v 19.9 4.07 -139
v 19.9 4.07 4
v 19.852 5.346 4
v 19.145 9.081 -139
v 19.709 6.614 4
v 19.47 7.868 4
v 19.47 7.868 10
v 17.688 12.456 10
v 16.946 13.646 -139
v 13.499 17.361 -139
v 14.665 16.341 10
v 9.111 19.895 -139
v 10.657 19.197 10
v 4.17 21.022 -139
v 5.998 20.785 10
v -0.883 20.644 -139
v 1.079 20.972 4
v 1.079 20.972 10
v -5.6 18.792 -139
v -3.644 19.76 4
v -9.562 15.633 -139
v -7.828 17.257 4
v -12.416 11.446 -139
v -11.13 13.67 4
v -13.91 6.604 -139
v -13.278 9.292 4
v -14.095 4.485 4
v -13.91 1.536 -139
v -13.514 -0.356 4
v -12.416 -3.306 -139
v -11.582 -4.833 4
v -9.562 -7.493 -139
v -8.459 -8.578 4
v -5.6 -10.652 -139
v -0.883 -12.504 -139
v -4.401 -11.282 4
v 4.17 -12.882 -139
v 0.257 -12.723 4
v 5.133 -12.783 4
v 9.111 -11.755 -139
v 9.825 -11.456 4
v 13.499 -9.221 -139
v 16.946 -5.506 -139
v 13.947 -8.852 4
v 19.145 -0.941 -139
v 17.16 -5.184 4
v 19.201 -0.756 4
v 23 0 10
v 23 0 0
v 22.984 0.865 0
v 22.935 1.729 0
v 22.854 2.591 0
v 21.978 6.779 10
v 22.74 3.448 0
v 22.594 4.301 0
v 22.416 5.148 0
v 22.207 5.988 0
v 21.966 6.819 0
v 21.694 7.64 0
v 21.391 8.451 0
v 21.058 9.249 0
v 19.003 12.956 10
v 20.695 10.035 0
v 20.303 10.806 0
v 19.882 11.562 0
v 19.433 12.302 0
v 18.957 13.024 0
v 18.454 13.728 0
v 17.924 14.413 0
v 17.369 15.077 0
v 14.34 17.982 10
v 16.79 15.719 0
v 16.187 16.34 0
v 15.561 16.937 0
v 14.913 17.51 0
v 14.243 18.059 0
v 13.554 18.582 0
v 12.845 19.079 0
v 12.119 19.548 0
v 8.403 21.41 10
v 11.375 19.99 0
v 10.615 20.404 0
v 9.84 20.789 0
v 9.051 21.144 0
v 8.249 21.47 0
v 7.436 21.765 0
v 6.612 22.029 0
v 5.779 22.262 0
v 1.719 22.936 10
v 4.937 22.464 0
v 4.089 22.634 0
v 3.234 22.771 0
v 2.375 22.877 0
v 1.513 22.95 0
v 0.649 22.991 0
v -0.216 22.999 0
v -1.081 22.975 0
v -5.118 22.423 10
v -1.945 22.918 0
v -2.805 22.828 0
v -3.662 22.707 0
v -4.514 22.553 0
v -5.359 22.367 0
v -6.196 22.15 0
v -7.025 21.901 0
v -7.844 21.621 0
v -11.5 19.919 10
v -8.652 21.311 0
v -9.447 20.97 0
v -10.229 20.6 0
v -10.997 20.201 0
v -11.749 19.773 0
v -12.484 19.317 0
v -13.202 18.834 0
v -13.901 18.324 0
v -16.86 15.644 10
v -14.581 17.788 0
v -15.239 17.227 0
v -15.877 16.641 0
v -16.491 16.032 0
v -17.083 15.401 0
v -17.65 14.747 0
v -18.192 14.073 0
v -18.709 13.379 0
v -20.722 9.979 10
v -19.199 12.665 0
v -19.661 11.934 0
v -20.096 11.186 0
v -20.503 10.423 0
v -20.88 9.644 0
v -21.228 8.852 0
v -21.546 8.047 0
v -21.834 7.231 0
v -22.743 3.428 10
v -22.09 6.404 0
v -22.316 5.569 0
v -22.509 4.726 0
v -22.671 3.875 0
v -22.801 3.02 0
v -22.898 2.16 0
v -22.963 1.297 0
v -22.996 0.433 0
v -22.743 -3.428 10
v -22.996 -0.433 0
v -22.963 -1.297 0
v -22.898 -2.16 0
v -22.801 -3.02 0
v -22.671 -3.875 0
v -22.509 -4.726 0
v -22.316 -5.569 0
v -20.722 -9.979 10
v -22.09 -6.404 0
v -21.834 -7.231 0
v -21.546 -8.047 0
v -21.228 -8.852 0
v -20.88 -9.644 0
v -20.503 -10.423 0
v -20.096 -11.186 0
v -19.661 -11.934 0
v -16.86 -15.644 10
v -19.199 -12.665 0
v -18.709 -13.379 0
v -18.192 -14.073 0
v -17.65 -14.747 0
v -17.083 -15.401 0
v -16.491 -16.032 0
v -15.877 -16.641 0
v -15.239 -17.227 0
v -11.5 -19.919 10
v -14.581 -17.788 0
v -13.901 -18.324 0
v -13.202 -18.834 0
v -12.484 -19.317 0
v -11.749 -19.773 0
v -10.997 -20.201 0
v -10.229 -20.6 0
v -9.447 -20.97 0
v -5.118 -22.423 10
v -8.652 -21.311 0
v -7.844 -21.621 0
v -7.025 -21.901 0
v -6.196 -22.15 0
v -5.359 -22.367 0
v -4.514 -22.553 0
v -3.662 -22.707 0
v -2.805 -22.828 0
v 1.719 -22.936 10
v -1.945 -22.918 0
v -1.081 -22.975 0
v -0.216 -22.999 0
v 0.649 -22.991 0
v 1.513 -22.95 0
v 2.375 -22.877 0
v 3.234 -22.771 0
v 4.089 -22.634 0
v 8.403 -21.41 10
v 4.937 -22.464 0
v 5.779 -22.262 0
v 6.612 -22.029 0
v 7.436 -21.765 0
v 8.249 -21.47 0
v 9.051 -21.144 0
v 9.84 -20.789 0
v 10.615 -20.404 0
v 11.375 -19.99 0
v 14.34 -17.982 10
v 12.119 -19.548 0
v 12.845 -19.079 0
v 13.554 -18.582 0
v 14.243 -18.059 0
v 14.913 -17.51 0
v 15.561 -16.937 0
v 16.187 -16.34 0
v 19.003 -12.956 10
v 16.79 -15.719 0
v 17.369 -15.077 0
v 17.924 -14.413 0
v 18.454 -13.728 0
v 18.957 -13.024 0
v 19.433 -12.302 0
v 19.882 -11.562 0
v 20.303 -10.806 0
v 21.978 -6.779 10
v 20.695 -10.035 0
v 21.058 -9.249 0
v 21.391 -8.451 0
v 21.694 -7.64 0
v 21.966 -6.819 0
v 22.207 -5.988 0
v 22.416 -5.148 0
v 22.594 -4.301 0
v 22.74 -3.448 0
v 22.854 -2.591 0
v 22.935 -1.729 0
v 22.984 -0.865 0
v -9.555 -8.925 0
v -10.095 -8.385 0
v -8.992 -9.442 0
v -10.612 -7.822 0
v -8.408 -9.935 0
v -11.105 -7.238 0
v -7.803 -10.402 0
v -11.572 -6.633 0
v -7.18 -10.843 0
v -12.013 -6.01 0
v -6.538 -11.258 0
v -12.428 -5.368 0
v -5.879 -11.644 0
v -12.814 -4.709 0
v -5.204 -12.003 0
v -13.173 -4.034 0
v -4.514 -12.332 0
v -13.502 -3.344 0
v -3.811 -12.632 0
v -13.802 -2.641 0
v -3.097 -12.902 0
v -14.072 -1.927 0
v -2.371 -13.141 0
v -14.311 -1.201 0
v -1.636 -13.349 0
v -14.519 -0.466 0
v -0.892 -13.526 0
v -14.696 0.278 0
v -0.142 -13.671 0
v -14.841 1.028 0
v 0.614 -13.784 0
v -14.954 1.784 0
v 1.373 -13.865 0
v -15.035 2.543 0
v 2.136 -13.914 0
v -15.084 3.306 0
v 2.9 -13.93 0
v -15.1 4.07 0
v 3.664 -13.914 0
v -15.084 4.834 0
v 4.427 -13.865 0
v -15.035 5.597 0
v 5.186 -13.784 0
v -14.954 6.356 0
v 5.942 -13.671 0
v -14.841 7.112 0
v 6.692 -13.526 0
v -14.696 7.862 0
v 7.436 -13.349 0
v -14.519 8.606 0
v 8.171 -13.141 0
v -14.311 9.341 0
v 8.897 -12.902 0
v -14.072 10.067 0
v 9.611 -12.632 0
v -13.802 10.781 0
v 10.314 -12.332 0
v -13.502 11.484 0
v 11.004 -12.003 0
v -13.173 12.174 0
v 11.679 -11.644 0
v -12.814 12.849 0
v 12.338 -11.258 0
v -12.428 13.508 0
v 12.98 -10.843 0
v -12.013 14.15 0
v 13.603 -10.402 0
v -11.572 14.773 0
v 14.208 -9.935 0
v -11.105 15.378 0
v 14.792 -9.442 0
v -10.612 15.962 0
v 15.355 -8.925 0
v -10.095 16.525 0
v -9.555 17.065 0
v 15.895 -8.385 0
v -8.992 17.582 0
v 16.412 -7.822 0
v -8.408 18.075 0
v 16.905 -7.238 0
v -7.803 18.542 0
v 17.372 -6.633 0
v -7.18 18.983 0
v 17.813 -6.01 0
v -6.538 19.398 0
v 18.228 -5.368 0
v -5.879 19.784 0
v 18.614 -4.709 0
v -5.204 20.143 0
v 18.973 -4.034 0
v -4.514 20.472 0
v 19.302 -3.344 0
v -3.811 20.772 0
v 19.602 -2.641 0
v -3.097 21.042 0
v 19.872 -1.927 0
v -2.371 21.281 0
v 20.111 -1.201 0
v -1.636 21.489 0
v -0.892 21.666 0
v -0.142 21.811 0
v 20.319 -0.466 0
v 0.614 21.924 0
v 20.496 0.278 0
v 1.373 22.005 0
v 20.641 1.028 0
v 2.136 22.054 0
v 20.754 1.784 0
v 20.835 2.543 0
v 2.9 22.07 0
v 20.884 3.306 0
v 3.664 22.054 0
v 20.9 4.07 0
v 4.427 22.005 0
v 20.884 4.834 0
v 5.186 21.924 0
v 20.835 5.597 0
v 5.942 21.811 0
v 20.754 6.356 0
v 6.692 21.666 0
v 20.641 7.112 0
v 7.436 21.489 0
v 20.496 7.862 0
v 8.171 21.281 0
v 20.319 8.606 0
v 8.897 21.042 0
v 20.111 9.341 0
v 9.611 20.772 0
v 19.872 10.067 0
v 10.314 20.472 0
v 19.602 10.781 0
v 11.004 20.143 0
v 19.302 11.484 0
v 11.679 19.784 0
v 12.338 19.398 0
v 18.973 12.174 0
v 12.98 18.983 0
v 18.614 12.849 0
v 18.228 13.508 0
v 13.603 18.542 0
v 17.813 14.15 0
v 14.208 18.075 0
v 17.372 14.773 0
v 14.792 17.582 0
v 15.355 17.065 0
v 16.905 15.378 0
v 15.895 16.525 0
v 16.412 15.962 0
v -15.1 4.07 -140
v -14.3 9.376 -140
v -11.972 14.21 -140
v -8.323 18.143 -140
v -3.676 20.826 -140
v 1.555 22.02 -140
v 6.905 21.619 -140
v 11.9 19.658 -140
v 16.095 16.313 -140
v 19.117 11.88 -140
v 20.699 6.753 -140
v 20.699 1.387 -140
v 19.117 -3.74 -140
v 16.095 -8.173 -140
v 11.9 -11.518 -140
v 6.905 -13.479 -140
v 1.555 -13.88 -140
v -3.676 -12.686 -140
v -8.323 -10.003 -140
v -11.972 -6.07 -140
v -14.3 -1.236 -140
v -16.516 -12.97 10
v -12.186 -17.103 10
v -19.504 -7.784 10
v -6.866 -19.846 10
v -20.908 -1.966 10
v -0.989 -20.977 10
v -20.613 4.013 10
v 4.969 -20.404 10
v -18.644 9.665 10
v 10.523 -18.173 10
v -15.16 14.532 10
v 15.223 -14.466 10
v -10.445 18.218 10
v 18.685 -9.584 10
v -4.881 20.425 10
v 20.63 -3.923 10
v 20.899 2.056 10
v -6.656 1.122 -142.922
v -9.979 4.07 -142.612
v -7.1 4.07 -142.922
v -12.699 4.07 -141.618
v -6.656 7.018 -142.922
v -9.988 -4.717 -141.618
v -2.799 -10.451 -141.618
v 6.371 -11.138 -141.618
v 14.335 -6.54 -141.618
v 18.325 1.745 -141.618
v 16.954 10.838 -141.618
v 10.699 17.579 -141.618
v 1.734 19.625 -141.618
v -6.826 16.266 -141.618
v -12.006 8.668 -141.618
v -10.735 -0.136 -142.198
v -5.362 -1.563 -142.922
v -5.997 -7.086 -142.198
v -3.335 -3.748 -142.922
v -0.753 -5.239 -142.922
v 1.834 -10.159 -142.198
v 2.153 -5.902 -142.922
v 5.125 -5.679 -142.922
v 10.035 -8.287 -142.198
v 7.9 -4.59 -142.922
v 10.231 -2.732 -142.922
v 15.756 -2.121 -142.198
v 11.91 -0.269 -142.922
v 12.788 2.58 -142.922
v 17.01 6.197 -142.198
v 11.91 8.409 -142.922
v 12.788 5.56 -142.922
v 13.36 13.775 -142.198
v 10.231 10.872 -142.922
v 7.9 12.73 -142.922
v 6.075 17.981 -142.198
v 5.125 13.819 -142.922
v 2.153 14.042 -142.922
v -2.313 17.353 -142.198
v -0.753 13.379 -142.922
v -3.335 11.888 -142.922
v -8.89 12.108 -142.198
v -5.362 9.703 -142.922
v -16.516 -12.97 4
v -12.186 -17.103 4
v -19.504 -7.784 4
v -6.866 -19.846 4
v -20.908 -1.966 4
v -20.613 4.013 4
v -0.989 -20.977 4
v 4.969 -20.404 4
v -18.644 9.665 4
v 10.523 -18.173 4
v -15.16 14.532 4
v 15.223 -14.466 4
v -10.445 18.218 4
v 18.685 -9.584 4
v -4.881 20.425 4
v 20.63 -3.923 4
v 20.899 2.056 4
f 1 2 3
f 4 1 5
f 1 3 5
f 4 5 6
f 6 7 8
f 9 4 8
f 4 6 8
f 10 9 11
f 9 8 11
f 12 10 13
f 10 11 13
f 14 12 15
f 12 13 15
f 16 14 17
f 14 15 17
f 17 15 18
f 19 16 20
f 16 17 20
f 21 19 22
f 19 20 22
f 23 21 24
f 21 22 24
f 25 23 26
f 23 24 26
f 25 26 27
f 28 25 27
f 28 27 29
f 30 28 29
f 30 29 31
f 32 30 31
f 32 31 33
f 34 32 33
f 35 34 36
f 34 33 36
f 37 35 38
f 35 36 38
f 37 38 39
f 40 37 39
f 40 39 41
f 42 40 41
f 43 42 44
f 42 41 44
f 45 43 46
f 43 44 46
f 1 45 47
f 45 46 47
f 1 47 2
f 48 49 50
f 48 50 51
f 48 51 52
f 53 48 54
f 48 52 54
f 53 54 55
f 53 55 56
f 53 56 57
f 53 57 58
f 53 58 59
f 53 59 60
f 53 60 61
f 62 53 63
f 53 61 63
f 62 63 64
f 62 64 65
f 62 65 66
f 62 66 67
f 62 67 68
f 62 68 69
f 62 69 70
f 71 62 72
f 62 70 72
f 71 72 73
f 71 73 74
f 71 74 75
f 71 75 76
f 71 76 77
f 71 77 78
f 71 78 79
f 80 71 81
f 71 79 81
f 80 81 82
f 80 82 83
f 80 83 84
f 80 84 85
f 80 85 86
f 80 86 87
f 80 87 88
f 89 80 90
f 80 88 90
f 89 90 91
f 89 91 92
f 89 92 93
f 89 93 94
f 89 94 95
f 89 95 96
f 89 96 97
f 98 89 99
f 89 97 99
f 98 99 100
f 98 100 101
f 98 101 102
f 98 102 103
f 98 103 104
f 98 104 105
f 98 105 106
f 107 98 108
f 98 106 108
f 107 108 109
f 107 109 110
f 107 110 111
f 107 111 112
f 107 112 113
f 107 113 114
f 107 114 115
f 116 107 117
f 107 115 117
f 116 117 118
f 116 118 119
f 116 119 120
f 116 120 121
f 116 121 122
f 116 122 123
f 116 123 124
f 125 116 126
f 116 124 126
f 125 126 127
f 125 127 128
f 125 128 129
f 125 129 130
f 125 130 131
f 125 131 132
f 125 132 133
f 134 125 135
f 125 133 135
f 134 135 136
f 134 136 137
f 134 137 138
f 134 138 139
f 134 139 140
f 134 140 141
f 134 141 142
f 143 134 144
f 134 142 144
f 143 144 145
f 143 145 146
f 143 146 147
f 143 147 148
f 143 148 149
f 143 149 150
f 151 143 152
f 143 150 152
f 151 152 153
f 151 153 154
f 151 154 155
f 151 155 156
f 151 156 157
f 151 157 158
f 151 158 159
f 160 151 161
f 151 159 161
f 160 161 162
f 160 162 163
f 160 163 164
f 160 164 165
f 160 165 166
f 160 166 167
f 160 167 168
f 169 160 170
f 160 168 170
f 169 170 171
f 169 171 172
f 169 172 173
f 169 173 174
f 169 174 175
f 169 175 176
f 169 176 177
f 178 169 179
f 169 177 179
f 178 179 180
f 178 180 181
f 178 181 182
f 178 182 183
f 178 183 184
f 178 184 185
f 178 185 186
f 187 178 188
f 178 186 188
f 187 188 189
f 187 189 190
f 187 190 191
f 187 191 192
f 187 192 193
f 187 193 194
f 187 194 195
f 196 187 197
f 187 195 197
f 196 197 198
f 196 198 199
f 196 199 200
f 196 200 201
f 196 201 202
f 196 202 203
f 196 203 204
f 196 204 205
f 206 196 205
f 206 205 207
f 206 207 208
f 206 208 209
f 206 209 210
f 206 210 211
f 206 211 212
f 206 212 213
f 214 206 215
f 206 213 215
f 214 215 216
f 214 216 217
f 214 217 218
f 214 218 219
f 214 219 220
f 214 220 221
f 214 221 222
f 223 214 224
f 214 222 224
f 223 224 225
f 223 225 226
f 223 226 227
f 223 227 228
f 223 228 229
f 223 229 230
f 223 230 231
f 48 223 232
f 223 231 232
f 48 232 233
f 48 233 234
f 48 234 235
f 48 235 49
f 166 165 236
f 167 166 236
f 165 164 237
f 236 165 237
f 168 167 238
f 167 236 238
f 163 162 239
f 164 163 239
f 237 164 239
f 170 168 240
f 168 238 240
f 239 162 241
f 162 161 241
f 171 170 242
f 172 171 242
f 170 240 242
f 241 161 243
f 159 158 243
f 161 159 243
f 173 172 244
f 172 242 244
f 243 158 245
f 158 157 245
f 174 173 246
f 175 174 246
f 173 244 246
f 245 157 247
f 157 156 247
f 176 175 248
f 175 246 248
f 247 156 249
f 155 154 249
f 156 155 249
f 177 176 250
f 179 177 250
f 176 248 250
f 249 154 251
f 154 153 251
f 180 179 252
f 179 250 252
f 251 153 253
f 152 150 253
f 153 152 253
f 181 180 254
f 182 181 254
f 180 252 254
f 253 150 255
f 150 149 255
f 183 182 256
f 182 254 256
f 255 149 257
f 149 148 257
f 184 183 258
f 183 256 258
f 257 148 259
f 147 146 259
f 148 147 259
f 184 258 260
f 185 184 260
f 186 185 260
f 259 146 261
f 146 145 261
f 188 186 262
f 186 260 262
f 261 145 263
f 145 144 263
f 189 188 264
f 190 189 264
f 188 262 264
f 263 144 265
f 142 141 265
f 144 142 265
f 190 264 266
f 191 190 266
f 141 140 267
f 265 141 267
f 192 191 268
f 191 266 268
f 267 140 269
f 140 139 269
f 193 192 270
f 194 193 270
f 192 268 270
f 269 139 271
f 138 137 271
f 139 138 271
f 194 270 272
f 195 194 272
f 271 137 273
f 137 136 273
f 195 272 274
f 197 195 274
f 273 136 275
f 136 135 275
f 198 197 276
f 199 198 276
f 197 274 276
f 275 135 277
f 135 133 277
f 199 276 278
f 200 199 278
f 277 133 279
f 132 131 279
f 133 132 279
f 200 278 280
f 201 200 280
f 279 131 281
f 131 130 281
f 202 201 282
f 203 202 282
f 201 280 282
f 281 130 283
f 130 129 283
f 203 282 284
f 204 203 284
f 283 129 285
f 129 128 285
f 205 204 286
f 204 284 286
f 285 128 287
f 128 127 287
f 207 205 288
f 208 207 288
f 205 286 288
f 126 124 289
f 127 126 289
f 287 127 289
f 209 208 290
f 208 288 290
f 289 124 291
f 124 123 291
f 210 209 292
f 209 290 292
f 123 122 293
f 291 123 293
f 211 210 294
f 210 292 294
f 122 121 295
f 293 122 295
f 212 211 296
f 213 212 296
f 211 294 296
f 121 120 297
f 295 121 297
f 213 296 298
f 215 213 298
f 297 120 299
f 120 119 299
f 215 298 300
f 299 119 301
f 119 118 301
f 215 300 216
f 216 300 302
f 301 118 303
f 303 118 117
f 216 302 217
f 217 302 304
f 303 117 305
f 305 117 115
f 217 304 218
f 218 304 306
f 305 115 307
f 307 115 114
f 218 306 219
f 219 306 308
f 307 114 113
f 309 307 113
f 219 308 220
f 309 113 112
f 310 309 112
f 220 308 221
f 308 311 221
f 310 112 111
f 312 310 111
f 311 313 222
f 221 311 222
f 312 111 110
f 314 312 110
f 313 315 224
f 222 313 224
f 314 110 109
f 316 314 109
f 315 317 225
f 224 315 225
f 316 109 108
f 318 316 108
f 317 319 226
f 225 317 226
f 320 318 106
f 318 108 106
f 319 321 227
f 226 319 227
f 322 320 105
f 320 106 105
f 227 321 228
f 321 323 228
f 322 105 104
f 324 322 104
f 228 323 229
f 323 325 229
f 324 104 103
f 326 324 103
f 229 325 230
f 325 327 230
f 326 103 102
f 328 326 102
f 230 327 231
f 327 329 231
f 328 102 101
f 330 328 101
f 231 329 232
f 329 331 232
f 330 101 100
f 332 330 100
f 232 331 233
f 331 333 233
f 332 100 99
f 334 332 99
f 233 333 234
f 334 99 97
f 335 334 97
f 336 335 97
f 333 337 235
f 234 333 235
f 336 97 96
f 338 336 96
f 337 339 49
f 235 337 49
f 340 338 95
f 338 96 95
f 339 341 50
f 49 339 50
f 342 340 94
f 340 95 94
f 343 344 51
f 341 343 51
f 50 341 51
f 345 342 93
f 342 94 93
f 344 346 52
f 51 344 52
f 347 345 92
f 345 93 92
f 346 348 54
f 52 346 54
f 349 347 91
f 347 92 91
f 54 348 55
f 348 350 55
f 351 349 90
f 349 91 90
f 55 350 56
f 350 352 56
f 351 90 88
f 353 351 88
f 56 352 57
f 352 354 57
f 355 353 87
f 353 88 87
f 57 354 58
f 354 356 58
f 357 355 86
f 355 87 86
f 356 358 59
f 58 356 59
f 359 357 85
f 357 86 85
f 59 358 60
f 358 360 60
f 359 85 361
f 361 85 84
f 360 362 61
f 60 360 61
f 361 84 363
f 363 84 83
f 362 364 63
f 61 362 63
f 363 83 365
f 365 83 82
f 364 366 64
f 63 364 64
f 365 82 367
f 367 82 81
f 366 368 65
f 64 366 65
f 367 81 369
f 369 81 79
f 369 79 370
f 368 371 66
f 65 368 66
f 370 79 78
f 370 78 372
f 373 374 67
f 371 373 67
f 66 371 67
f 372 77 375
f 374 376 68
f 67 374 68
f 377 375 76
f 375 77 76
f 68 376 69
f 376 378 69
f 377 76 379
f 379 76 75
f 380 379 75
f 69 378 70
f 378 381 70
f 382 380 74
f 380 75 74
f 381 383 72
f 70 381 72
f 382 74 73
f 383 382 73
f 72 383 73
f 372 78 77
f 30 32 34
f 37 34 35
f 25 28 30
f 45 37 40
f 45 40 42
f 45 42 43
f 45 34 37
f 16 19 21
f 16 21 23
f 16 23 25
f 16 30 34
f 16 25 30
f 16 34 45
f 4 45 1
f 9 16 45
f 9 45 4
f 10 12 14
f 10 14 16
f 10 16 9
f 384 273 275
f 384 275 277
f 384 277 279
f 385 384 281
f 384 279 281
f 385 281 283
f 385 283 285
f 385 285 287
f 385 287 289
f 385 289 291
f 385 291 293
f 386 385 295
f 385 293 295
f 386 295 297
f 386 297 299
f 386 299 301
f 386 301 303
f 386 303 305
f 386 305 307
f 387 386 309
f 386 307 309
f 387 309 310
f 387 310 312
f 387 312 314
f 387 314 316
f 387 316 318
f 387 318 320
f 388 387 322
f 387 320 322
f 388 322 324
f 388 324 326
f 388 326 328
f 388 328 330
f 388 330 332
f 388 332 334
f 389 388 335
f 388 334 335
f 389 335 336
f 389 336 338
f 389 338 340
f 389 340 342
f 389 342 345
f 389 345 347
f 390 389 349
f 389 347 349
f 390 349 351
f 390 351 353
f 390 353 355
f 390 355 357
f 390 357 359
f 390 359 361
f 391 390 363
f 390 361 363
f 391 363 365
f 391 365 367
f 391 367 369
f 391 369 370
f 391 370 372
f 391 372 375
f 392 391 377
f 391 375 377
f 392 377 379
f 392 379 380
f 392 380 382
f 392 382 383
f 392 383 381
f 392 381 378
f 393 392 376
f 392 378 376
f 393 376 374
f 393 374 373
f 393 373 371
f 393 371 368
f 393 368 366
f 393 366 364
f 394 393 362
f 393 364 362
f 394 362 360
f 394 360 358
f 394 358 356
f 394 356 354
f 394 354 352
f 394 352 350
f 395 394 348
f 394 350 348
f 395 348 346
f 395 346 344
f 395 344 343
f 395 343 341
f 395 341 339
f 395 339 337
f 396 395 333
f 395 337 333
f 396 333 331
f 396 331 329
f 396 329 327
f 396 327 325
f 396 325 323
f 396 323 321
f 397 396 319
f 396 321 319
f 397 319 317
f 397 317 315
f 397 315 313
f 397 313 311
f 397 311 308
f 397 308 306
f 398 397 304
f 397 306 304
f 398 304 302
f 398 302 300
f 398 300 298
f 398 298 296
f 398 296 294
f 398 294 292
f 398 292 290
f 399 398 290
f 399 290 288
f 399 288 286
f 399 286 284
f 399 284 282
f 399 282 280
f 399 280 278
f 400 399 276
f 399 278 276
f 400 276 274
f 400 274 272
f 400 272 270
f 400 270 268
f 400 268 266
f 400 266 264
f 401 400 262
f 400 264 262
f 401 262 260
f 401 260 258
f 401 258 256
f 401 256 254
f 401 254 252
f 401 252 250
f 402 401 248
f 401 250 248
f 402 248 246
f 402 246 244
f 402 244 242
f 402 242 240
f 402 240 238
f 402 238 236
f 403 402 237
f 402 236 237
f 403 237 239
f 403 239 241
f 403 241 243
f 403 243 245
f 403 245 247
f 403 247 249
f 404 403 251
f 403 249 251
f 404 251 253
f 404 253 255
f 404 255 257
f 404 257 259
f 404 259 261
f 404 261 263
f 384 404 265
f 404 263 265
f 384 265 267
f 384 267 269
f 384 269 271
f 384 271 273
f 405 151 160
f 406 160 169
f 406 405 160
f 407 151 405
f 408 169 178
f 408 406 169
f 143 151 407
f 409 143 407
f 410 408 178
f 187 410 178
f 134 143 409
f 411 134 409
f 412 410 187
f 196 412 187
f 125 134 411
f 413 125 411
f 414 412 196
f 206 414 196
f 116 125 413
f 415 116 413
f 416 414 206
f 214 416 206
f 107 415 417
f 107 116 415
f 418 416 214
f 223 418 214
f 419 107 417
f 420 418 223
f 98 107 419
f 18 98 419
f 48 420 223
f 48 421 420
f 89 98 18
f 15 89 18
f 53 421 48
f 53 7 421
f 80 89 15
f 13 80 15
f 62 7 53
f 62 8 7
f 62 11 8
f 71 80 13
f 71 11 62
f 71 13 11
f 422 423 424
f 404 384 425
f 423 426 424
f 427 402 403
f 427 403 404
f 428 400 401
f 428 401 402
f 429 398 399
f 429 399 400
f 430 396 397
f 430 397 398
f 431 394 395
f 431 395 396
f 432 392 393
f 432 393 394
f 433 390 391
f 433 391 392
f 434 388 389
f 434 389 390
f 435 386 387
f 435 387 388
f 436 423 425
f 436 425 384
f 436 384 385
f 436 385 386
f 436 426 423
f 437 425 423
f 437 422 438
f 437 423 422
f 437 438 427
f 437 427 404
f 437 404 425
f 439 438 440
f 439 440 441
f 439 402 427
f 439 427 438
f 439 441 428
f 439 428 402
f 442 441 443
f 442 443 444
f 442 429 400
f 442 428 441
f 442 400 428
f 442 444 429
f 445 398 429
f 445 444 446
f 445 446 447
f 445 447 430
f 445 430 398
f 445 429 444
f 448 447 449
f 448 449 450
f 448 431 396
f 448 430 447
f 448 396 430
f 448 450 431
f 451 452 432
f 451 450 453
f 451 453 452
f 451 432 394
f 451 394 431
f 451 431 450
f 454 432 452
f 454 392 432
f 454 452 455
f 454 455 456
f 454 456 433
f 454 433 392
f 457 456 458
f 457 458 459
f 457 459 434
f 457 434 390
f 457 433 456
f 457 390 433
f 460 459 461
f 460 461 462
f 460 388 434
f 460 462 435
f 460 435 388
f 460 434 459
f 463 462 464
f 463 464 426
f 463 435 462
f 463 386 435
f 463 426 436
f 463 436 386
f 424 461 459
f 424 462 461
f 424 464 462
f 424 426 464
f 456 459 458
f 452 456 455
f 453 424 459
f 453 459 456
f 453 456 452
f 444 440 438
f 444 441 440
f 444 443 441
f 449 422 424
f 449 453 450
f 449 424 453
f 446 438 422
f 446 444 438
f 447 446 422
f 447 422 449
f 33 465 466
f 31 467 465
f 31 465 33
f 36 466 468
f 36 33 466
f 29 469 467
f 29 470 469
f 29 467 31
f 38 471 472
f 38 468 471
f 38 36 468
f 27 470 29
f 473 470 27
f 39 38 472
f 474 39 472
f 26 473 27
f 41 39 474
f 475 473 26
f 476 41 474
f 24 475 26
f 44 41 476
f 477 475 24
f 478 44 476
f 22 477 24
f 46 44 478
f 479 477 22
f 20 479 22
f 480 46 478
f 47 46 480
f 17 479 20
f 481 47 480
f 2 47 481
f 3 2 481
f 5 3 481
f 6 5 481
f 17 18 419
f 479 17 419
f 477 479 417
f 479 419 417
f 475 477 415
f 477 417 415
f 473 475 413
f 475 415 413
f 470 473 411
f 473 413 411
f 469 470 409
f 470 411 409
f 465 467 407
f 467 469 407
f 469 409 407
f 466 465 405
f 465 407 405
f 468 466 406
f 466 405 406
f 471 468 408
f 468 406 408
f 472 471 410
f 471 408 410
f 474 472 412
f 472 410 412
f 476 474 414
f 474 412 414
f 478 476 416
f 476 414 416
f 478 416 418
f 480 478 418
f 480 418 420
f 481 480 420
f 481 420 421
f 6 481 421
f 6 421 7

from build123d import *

# Parameters (mm, degrees)
SKETCH1_R           = 23
BOSS_EXTRUDE1_DEPTH = 10
SKETCH2_R           = 18
BOSS_EXTRUDE2_DEPTH = 140
SKETCH3_R           = 21
CUT_EXTRUDE1_DEPTH  = 6
SKETCH4_R           = 17
CUT_EXTRUDE2_DEPTH  = 143
CUT_EXTRUDE3_START  = 10
SKETCH5_R           = 17
CUT_EXTRUDE3_DEPTH  = 10


with BuildPart() as part:
    # Sketch1 → Boss-Extrude1 (new body)
    with BuildSketch(Plane.XY):
        Circle(SKETCH1_R)
    extrude(amount=BOSS_EXTRUDE1_DEPTH)

    # Sketch2 → Boss-Extrude2 (add)
    with BuildSketch(Plane(origin=(0, 0, 0), x_dir=(-1, 0, 0), z_dir=(0, 0, -1))):
        with Locations((-2.9, 4.07)):
            Circle(SKETCH2_R)
    extrude(amount=BOSS_EXTRUDE2_DEPTH)

    # Sketch3 → Cut-Extrude1 (cut)
    with BuildSketch(Plane.XY.offset(10)):
        Circle(SKETCH3_R)
    extrude(amount=-CUT_EXTRUDE1_DEPTH, mode=Mode.SUBTRACT)

    # Sketch4 → Cut-Extrude2 (cut)
    with BuildSketch(Plane.XY.offset(4)):
        with Locations((2.9, 4.07)):
            Circle(SKETCH4_R)
    extrude(amount=-CUT_EXTRUDE2_DEPTH, mode=Mode.SUBTRACT)

    # Sketch5 → Cut-Extrude3 (cut)
    with BuildSketch(Plane.XY.offset(4).offset(CUT_EXTRUDE3_START)):
        with Locations((2.9, 4.07)):
            Circle(SKETCH5_R)
    extrude(amount=-CUT_EXTRUDE3_DEPTH, mode=Mode.SUBTRACT)

    # Sketch6 → Revolve1 (revolve)
    with BuildSketch(Plane(origin=(0, 4.07, 0), x_dir=(1, 0, 0), z_dir=(0, 1, 0))):
        with BuildLine():
            Line((2.9, 142.921547381), (-7.1, 142.921547381))
            ThreePointArc((-7.1, 142.921547381), (-11.369159906, 142.197807517), (-15.1, 140))
            Line((-15.1, 140), (2.9, 140))
            Line((2.9, 140), (2.9, 142.921547381))
        make_face()
    revolve(axis=Axis((2.9, 4.07, -149.3931931), (0, 0, 1)))


solid = part.part
